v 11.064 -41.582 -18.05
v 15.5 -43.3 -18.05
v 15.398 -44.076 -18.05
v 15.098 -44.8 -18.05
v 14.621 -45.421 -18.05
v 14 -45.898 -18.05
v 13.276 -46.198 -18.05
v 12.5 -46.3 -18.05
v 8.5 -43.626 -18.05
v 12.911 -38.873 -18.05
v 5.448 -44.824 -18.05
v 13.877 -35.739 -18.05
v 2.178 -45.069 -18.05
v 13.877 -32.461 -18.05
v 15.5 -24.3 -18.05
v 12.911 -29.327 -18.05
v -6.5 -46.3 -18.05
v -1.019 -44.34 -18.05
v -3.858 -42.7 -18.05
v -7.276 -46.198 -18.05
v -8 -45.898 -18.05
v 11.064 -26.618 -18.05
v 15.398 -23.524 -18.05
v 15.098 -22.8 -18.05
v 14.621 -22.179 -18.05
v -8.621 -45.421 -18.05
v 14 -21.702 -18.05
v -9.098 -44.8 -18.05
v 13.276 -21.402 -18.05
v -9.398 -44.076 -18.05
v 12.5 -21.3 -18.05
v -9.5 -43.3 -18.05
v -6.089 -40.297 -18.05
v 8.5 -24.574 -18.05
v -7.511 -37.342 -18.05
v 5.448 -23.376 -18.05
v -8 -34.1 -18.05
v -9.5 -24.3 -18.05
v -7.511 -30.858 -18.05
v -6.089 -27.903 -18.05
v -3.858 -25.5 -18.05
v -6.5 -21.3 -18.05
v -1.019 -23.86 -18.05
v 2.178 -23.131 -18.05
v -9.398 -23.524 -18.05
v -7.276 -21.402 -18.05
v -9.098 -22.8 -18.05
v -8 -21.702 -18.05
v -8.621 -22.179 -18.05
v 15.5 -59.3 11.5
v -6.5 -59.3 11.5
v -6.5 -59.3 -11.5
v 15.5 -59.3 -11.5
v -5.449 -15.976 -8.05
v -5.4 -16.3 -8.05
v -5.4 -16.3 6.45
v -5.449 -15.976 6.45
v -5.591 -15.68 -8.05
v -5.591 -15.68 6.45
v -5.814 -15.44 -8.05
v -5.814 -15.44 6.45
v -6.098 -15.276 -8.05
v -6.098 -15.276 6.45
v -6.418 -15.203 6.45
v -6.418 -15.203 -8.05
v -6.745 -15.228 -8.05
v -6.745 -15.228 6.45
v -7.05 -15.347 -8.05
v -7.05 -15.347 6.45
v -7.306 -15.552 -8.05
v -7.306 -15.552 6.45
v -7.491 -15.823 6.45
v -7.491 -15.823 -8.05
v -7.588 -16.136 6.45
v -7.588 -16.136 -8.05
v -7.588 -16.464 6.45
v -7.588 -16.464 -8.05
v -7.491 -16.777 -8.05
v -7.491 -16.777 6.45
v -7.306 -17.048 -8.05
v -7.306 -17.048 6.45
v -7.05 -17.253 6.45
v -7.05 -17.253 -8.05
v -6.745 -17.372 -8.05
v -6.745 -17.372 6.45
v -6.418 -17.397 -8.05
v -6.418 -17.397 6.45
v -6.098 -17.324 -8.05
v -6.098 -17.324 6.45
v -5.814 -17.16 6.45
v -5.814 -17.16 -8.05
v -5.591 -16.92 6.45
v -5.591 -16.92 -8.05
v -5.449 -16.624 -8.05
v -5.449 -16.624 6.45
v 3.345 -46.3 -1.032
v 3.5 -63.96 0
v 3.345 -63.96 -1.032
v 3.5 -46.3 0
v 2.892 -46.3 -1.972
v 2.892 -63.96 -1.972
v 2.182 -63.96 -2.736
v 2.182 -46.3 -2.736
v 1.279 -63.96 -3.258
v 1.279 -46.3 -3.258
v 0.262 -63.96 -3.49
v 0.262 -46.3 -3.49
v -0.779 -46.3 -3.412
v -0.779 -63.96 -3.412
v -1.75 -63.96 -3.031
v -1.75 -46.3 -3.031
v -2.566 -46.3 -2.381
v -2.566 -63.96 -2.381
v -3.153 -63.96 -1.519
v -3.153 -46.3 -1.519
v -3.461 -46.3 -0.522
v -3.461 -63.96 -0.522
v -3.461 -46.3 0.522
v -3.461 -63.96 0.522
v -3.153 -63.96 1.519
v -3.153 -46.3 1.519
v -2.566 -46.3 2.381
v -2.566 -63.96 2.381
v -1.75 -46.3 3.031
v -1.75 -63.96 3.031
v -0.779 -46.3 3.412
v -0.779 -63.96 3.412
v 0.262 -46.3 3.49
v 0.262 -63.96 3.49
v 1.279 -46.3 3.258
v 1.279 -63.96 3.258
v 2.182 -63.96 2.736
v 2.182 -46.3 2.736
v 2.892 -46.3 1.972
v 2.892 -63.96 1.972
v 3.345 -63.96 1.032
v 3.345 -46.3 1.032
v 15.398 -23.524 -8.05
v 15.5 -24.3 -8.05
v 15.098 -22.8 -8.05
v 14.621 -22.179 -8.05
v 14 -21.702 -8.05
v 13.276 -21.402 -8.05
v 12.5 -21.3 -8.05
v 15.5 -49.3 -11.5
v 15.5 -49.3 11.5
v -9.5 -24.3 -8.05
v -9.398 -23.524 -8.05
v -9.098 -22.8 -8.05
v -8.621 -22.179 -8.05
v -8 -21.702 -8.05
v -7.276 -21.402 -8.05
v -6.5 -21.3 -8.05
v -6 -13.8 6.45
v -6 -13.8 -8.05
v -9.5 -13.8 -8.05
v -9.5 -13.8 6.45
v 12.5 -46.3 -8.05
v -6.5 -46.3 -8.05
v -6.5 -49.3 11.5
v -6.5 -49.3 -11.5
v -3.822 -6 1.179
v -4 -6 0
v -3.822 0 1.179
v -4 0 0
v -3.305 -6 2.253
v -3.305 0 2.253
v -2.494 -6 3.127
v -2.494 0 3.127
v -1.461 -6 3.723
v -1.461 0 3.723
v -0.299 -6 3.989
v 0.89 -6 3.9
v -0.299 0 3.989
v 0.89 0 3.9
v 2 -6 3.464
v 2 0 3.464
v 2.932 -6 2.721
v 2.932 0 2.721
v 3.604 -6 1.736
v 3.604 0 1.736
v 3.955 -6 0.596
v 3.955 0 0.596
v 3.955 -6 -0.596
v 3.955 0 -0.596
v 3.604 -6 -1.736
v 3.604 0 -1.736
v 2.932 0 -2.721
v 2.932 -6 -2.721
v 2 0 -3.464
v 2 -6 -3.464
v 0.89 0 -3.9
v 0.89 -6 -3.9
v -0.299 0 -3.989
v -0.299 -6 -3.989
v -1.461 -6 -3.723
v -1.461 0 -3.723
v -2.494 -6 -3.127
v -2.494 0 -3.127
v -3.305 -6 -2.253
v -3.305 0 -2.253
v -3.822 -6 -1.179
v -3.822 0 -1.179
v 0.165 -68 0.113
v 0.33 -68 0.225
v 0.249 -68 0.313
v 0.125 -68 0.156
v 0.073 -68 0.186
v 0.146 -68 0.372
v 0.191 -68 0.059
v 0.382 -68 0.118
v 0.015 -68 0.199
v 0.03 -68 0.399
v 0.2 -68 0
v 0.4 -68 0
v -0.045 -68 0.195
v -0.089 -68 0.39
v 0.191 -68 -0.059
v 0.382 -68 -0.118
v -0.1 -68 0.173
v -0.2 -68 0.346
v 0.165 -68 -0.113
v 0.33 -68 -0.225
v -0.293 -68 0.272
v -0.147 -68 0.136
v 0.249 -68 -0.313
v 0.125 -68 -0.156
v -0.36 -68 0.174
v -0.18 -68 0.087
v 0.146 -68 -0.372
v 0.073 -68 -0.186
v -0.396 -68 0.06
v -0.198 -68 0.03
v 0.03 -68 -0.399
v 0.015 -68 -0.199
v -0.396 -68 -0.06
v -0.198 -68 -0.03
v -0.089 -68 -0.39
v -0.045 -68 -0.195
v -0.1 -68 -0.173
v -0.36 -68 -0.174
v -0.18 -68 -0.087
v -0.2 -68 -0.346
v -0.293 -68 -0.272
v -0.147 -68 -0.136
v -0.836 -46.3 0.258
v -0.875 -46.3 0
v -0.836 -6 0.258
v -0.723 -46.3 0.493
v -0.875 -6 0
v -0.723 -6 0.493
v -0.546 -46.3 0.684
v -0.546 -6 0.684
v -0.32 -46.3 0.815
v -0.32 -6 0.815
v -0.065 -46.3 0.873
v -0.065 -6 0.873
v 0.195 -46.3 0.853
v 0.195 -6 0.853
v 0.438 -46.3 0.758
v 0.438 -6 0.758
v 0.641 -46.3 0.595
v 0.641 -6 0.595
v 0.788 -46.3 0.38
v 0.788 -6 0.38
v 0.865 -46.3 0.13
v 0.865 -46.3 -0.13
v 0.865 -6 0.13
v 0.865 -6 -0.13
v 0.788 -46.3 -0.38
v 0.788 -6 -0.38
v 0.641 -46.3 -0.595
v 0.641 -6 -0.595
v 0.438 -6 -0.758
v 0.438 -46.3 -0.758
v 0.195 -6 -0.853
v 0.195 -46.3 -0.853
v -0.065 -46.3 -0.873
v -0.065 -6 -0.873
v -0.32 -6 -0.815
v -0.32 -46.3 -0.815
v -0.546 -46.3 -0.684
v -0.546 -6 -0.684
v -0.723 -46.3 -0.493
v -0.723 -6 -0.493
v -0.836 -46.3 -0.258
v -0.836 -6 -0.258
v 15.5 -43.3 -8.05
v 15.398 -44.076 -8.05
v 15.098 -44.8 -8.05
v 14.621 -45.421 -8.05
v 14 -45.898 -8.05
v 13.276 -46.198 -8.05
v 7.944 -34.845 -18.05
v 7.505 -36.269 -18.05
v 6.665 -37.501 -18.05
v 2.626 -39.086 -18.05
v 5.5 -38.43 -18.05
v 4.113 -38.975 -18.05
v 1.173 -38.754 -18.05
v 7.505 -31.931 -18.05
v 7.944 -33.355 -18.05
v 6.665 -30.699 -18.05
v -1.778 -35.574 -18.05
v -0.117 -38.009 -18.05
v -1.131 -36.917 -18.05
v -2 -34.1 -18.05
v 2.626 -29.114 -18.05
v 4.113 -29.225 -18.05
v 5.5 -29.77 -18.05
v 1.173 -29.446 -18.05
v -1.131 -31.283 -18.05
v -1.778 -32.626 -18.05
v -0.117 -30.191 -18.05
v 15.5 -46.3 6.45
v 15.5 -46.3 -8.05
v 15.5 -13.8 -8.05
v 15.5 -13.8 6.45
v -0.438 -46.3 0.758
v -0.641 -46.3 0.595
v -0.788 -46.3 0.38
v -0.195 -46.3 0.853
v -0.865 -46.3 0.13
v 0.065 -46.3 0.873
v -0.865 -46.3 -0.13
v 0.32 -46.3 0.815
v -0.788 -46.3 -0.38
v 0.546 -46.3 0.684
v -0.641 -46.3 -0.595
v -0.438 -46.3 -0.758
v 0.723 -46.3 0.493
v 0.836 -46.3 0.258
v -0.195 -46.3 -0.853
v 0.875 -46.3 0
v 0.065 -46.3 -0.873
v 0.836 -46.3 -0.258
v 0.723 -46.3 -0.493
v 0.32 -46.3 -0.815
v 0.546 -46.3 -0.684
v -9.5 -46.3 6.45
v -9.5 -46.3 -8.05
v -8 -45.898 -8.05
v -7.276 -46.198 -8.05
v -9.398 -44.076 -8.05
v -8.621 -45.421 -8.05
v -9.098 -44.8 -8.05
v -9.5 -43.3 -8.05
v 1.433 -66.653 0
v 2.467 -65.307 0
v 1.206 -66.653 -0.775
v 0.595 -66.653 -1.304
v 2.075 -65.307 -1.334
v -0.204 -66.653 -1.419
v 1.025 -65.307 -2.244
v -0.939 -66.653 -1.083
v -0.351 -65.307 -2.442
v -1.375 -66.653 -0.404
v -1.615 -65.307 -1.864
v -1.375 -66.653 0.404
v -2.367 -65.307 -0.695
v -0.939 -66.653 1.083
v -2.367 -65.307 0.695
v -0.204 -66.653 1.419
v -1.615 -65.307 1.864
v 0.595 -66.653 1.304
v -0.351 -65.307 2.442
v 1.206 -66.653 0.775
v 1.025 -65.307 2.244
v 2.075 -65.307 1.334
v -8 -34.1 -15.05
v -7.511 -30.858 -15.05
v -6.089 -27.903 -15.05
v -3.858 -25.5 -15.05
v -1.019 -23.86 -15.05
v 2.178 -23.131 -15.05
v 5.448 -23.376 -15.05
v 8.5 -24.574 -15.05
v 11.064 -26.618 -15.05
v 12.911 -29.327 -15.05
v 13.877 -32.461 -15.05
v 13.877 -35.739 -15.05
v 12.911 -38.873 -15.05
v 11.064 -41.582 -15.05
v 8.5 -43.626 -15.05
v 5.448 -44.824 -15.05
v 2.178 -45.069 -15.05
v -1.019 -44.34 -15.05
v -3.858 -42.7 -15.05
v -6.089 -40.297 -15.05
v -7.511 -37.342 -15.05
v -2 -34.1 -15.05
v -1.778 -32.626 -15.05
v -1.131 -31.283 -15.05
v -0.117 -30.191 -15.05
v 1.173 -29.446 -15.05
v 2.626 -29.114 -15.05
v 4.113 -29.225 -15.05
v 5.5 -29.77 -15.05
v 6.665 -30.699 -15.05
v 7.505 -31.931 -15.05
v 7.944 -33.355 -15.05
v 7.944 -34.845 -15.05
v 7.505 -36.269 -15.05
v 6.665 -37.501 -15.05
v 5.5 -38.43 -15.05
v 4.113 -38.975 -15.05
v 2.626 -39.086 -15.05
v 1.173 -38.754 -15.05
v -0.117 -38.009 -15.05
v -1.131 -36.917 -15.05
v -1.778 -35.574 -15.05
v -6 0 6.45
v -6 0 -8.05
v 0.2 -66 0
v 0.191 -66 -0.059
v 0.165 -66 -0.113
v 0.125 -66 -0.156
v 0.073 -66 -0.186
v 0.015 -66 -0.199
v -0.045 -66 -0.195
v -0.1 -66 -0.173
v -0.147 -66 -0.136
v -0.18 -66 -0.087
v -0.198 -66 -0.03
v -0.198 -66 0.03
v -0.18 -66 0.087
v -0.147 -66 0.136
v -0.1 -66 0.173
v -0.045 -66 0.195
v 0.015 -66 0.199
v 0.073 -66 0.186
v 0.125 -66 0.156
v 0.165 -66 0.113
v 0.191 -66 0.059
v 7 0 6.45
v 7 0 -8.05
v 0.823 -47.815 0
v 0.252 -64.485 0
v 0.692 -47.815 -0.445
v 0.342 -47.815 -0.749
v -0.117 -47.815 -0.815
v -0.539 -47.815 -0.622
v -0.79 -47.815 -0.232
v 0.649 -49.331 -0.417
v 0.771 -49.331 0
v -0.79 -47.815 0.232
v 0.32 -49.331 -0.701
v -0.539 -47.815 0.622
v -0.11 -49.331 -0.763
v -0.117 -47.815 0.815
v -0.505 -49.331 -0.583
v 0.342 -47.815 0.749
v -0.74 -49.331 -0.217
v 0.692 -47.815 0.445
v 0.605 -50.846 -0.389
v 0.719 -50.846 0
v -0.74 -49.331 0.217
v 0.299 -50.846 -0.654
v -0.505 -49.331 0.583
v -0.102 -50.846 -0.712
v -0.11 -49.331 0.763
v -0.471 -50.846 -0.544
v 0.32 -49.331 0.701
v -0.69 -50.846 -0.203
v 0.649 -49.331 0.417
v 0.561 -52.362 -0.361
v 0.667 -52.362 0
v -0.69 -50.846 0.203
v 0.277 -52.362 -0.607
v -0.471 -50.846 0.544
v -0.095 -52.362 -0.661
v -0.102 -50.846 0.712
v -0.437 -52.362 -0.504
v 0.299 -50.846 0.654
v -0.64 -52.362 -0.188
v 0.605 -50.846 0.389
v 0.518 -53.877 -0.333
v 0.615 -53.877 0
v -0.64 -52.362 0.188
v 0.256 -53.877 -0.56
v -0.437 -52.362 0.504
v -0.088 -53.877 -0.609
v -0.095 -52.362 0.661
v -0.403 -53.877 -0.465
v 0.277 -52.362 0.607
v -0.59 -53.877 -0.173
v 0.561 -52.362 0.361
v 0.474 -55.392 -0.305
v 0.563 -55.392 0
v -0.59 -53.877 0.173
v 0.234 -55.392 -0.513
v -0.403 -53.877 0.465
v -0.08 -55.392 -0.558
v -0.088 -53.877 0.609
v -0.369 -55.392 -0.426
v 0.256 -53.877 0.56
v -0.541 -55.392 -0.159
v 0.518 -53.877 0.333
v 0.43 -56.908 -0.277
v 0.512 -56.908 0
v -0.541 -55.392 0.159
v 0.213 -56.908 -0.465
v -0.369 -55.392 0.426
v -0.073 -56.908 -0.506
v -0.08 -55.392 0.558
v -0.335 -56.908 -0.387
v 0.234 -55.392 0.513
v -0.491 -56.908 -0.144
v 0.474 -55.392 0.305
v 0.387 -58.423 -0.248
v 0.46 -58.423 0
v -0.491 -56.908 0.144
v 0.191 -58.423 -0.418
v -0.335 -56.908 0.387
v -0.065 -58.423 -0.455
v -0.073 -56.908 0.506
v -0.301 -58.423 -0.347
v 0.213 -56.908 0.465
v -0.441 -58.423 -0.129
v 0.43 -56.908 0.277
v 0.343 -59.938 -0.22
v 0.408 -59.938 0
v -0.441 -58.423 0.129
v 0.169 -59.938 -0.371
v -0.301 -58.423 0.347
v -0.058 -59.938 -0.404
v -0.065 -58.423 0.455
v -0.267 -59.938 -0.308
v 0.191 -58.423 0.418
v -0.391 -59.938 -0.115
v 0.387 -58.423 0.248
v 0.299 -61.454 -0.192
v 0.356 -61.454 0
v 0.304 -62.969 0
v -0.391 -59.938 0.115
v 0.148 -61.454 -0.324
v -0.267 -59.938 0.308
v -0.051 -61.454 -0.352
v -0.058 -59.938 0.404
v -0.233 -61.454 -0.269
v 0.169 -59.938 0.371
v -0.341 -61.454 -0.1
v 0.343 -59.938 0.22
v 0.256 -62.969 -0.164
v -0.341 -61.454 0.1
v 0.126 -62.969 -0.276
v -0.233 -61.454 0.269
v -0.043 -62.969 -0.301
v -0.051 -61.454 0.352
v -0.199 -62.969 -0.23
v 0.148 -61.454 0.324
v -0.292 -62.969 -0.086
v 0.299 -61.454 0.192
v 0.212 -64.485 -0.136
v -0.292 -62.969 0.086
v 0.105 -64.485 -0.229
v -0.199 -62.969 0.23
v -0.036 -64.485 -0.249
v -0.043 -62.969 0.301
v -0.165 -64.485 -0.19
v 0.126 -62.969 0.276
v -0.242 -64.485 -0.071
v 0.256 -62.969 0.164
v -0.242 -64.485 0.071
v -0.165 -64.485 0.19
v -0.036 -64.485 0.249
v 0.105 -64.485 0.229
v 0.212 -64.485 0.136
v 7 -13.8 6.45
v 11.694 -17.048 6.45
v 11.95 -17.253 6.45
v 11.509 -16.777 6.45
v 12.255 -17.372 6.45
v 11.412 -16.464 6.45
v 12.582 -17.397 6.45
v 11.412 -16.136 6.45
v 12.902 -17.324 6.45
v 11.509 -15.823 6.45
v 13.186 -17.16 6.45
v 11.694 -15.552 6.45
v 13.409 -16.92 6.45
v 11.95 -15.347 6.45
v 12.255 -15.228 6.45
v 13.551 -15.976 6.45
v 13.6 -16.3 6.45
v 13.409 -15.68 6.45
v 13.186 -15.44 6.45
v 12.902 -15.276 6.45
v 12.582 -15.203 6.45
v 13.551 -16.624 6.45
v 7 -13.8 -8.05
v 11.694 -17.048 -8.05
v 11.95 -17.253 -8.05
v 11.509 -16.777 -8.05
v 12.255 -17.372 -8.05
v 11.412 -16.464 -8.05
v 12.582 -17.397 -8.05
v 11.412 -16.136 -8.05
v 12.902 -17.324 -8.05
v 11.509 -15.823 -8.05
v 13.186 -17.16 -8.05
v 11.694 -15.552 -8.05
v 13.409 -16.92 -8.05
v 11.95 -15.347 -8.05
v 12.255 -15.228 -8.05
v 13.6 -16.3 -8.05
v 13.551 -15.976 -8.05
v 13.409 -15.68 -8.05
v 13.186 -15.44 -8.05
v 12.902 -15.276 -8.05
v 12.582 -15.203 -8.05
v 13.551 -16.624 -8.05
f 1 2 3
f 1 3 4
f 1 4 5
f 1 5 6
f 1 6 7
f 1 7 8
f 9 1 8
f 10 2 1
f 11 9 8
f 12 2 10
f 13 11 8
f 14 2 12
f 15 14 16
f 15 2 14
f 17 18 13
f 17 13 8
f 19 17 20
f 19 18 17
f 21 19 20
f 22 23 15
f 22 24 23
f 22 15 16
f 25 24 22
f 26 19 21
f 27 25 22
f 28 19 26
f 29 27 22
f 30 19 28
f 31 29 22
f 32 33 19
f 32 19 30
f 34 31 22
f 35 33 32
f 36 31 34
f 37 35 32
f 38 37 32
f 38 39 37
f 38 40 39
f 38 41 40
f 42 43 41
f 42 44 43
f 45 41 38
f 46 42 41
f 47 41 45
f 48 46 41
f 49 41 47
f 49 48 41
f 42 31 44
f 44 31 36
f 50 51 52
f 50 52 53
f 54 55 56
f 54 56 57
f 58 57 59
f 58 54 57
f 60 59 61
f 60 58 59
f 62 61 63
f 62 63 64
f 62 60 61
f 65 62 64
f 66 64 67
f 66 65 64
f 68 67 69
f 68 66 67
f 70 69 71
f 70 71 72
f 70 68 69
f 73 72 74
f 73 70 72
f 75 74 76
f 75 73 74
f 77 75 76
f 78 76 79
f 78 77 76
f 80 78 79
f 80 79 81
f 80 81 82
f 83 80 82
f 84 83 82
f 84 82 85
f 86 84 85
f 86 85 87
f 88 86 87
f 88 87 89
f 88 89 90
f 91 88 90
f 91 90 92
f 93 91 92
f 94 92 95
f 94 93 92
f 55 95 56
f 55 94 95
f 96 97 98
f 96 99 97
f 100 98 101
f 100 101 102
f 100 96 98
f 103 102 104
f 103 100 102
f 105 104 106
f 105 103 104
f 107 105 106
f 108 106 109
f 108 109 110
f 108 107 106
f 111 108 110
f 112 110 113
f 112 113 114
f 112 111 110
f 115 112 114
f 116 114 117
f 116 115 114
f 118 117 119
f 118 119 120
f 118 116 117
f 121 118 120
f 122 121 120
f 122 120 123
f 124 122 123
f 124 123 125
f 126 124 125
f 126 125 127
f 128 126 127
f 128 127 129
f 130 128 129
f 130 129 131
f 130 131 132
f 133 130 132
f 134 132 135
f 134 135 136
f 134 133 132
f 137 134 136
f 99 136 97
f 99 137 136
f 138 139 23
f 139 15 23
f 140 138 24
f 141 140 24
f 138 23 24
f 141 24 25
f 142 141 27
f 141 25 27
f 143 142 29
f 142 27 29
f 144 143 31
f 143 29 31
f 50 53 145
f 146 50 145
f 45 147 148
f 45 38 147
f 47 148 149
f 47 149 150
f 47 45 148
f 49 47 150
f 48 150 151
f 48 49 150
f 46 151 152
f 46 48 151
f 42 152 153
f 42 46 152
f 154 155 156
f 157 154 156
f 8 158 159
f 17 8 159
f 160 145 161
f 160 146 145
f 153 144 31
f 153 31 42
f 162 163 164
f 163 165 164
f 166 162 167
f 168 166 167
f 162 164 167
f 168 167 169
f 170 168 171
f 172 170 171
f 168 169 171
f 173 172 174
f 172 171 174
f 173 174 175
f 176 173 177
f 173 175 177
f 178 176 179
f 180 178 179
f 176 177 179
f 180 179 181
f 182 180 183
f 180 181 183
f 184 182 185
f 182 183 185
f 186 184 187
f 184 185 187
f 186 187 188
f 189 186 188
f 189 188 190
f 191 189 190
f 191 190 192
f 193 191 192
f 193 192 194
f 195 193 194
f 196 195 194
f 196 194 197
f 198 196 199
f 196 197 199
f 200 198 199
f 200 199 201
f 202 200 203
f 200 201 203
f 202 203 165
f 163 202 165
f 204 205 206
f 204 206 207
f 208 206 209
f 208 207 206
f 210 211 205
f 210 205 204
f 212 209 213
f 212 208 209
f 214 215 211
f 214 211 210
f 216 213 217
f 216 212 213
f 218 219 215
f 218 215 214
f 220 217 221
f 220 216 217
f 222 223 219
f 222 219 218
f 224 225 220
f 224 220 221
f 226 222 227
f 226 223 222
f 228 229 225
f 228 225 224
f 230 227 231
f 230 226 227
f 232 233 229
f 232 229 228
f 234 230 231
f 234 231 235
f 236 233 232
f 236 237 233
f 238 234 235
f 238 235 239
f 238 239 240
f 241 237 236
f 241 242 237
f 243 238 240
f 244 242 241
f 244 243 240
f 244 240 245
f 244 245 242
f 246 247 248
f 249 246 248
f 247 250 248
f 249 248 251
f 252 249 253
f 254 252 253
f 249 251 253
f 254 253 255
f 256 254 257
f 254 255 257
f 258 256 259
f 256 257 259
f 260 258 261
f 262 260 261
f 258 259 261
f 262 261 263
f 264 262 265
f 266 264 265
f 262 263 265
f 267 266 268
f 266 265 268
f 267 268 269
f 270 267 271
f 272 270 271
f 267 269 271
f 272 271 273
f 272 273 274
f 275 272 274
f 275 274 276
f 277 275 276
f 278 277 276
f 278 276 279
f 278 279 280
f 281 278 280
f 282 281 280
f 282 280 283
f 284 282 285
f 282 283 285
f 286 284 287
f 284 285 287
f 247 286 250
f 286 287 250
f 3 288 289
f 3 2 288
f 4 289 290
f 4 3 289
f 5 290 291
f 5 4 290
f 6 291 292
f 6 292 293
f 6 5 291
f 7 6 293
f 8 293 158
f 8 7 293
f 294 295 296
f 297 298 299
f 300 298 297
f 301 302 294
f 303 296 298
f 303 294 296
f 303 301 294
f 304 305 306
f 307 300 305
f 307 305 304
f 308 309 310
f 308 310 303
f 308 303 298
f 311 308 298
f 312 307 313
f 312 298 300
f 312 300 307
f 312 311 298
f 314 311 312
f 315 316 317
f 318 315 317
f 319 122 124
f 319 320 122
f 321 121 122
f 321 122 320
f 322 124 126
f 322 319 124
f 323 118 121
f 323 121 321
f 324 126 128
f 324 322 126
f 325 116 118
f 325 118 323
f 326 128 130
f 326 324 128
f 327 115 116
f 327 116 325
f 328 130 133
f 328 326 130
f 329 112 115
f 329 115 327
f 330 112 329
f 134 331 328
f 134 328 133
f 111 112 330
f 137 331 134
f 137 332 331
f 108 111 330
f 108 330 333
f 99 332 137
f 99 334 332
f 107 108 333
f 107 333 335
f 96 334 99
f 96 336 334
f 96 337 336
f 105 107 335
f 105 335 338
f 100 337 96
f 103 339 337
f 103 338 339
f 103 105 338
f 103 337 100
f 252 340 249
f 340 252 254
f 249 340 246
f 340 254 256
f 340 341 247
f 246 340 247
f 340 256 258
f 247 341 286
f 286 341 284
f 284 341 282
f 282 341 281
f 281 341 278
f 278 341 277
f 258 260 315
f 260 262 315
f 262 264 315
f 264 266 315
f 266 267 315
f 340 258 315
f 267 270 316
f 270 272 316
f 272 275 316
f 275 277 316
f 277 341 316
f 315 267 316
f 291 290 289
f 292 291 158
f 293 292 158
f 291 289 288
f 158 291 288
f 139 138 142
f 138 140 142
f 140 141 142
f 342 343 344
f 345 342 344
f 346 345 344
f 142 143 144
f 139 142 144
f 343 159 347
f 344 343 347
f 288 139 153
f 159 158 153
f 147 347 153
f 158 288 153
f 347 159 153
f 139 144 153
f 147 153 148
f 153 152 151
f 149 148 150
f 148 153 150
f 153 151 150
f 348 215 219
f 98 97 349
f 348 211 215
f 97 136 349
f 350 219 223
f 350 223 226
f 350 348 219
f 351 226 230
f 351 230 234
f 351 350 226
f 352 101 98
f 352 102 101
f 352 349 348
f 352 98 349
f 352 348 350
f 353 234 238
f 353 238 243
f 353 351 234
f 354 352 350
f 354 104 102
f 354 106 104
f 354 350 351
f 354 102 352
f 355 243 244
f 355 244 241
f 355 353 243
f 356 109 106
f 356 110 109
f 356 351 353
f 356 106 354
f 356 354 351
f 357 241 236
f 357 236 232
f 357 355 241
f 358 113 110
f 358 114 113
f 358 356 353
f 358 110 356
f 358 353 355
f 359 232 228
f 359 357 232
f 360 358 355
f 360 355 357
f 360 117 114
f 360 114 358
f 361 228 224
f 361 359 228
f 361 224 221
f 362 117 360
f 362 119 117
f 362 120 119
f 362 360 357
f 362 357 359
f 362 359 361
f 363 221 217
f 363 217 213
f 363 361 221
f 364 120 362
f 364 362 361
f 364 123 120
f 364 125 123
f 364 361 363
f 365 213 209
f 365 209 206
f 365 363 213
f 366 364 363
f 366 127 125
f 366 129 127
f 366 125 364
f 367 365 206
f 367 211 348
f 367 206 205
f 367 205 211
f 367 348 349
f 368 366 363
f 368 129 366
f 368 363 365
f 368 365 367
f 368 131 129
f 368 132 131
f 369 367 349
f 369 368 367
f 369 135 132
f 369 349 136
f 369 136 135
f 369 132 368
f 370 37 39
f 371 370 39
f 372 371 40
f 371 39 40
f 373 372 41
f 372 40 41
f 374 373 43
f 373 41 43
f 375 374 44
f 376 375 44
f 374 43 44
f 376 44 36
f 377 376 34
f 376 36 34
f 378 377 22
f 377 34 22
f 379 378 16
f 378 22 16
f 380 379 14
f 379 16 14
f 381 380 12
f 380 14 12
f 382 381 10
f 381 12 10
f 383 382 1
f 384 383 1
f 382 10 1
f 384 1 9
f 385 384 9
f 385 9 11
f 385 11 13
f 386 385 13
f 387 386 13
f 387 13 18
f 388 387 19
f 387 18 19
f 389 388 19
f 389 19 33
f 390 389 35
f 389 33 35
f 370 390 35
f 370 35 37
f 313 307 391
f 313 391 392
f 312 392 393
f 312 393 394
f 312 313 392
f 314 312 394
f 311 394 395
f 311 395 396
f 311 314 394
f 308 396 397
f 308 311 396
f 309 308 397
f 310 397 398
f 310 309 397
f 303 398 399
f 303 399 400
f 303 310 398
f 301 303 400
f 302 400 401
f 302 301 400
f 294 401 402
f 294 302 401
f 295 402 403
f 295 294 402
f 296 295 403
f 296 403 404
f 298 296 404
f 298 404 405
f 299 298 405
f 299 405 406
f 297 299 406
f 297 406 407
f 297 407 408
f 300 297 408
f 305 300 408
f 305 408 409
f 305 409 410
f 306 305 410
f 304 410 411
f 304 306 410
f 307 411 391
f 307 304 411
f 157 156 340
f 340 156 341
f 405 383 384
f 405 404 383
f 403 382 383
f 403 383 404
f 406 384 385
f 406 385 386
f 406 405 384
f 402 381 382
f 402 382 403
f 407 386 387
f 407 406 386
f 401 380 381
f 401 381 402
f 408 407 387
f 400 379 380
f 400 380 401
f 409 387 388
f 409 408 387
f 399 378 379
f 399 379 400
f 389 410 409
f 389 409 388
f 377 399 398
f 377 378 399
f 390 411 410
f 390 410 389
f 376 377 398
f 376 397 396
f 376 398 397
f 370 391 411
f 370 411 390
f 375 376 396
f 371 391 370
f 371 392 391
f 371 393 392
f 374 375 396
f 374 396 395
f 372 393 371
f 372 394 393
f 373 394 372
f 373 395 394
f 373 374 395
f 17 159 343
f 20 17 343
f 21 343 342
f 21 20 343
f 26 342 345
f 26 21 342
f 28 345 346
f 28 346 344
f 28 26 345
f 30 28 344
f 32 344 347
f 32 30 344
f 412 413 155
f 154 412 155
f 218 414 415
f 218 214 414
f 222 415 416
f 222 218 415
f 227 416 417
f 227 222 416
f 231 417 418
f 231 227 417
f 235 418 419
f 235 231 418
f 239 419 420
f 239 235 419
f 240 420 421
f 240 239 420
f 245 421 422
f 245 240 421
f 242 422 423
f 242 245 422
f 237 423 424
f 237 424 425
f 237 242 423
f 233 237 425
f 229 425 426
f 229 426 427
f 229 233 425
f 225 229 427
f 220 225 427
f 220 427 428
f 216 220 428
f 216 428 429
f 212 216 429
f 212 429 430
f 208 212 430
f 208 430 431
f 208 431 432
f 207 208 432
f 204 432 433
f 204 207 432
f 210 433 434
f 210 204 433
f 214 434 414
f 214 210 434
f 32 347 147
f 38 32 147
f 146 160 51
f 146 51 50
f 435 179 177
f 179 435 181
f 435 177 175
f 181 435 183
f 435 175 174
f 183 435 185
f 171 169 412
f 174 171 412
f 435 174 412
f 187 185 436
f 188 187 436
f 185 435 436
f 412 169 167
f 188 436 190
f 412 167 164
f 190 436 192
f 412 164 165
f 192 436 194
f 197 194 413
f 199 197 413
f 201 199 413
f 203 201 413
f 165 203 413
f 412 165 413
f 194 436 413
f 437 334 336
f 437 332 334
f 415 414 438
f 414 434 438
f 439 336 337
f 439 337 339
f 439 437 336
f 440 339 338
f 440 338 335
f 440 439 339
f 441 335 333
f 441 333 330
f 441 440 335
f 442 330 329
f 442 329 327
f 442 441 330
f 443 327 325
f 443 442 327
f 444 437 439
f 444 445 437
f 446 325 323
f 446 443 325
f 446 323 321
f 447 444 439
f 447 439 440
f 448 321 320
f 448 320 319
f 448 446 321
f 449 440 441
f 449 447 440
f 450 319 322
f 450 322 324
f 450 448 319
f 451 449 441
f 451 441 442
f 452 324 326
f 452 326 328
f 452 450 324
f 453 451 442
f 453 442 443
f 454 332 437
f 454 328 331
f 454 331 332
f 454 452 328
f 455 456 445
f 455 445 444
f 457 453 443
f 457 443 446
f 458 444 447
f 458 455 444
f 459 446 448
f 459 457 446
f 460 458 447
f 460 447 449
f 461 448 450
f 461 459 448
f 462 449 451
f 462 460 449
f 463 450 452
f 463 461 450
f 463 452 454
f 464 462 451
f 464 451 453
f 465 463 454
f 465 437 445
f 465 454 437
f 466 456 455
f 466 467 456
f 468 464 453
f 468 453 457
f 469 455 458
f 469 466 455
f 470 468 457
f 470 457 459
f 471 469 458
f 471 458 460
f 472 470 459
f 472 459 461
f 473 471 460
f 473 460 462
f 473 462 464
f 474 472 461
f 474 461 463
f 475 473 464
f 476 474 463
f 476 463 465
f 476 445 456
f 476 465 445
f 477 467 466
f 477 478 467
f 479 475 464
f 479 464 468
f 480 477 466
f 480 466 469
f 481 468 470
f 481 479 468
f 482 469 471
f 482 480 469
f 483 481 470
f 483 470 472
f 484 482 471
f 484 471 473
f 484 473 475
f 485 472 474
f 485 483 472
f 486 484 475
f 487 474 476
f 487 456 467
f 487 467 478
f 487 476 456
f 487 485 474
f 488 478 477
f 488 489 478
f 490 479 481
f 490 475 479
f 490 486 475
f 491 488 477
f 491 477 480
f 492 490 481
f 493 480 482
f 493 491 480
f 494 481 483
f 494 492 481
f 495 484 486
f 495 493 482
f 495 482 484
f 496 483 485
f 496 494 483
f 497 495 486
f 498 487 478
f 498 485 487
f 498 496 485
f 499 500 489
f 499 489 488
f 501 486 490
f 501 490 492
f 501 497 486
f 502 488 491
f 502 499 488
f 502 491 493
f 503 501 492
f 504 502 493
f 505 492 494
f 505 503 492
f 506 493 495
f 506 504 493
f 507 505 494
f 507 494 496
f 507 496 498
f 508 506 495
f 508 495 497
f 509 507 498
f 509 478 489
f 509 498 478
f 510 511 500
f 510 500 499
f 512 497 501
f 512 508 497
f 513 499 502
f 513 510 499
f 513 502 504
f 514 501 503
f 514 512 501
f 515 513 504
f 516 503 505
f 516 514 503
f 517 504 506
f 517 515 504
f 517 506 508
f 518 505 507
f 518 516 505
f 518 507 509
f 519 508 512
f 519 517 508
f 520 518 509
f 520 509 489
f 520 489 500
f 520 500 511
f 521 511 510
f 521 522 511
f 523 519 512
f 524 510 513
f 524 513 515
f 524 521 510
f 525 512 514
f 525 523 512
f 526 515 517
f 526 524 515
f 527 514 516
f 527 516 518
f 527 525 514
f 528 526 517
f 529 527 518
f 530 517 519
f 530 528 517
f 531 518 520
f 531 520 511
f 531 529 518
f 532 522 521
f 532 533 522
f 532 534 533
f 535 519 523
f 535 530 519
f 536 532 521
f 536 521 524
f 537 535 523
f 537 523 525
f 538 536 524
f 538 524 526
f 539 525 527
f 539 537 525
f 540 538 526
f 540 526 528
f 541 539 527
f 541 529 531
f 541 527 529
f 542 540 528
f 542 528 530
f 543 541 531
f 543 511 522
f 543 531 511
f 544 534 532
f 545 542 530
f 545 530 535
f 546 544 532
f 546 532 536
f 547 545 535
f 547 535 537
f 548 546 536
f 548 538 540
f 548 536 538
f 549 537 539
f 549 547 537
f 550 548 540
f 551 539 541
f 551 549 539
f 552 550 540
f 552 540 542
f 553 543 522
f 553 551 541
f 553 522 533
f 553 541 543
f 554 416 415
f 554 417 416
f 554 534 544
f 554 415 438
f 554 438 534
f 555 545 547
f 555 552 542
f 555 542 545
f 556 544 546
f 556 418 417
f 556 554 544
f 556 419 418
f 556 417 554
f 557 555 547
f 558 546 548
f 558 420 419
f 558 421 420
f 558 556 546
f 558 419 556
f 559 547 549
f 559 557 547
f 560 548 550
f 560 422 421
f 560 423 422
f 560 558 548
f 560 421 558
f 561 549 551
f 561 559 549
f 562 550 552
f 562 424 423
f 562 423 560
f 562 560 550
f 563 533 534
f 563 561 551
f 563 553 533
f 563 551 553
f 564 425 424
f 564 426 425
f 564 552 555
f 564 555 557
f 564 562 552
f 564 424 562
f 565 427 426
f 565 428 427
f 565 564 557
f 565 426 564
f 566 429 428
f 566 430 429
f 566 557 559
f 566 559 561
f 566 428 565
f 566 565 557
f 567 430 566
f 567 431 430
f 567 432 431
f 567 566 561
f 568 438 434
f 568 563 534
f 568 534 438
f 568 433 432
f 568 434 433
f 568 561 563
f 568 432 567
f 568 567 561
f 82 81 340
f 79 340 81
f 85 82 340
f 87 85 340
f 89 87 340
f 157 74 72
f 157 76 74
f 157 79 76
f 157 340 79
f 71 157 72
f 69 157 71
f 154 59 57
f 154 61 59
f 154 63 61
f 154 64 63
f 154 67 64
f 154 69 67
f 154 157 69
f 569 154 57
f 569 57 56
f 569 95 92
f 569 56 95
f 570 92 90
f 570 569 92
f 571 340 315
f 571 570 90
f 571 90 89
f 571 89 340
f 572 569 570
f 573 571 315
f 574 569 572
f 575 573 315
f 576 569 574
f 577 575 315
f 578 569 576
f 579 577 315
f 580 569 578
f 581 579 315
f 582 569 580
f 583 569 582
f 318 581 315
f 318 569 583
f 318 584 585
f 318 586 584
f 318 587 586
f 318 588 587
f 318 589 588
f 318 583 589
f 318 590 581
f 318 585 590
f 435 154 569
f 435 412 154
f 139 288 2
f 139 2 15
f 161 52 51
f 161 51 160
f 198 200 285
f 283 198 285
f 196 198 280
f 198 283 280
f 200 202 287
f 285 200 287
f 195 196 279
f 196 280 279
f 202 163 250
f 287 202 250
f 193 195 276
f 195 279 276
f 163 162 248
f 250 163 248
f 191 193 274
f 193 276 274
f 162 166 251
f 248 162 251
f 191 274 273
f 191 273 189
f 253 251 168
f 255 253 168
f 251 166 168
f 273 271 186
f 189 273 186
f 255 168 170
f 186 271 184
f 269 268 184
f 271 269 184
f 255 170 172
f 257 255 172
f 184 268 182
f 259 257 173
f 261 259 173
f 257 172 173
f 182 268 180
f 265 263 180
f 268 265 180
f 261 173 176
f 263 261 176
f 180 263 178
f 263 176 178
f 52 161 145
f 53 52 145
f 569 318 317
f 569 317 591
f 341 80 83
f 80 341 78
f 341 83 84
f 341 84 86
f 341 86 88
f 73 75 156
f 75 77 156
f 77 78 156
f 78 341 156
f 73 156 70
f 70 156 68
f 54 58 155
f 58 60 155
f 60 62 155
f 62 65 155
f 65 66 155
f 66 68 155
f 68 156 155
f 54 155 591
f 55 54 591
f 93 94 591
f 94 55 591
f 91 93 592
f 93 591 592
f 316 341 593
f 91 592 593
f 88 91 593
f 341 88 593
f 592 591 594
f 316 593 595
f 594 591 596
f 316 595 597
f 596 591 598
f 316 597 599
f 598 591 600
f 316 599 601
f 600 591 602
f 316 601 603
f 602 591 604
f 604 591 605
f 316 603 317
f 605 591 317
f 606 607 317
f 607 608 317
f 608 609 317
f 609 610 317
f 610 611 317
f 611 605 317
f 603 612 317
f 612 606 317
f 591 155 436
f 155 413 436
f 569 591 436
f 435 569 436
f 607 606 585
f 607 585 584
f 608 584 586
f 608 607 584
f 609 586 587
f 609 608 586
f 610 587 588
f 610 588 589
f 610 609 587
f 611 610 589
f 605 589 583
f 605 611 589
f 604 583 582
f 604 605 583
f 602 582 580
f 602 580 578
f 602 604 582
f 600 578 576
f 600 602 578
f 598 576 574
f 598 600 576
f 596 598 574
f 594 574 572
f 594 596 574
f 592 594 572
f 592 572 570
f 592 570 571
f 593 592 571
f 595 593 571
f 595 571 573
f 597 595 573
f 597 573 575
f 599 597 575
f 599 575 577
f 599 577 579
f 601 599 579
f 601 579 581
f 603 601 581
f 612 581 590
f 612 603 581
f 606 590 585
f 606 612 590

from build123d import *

# Parameters (mm, degrees)
BOSS_EXTRUDE1_DEPTH        = 6.45
BOSS_EXTRUDE1_DEPTH_BACK   = 8.05
SKETCH1_R                  = 1.1
BOSS_EXTRUDE1_2_DEPTH      = 6.45
BOSS_EXTRUDE1_2_DEPTH_BACK = 8.05
SKETCH1_W                  = 22
SKETCH1_H                  = 10
SKETCH1_7_W                = 6.5
SKETCH1_7_H                = 10
SKETCH1_7_W_2              = 12
BOSS_EXTRUDE2_DEPTH        = 11.5
SKETCH2_W                  = 25
SKETCH2_H                  = 25
SKETCH2_R                  = 11
SKETCH2_R_2                = 5
BOSS_EXTRUDE3_DEPTH        = 10
CUT_EXTRUDE1_START         = 10
SKETCH2_3_R                = 11
SKETCH2_3_R_2              = 5
CUT_EXTRUDE1_DEPTH         = 3
FILLET1_R                  = 3


# Read off the part's stored shape, not the designer's step: Revolve1
with BuildPart() as part:
    # Sketch1 → Boss-Extrude1 (new, two sides: drawn at the far end of the back side and taken through both)
    with BuildSketch(Plane.XY.offset(-BOSS_EXTRUDE1_DEPTH_BACK)):
        Polygon((7, 0), (-6, 0), (-6, -13.8), (-9.5, -13.8), (-9.5, -46.3), (15.5, -46.3), (15.5, -13.8), (7, -13.8), align=None)
        with Locations((-6.5, -16.3)):
            Circle(SKETCH1_R, mode=Mode.SUBTRACT)
        with Locations((12.5, -16.3)):
            Circle(SKETCH1_R, mode=Mode.SUBTRACT)
    extrude(amount=BOSS_EXTRUDE1_DEPTH + BOSS_EXTRUDE1_DEPTH_BACK)

    # Sketch1<6> → Cut-Revolve1 (revolve, cut)
    with BuildSketch(Plane.XY, mode=Mode.PRIVATE) as cut_revolve1_sk:
        Polygon((4, -6), (4, 0), (0, 0), (0, -46.3), (0.875, -46.3), (0.875, -6), align=None)
    revolve(cut_revolve1_sk.sketch.rotate(Axis((0, -281.964182831, 0), (0, 1, 0)), 180), axis=Axis((0, -281.964182831, 0), (0, 1, 0)), mode=Mode.SUBTRACT)


with BuildPart() as body_2:
    # Sketch1 → Boss-Extrude1 2 (new, two sides: drawn at the far end of the back side and taken through both)
    with BuildSketch(Plane.XY.offset(-BOSS_EXTRUDE1_2_DEPTH_BACK)):
        with Locations((4.5, -54.3)):
            Rectangle(SKETCH1_W, SKETCH1_H)
    extrude(amount=BOSS_EXTRUDE1_2_DEPTH + BOSS_EXTRUDE1_2_DEPTH_BACK)

    # Sketch1<7> → Boss-Extrude2 (add, symmetric)
    with BuildSketch(Plane.XY):
        with Locations((-3.25, -54.3)):
            Rectangle(SKETCH1_7_W, SKETCH1_7_H)
        Polygon((0.772208122, -49.3), (0, -49.3), (0, -59.3), (0.429568528, -59.3), align=None)
        Polygon((3.5, -49.3), (0.772208122, -49.3), (0.429568528, -59.3), (3.5, -59.3), align=None)
        with Locations((9.5, -54.3)):
            Rectangle(SKETCH1_7_W_2, SKETCH1_7_H)
    extrude(amount=BOSS_EXTRUDE2_DEPTH, both=True)


with BuildPart() as body_3:
    # Revolve1 outline → Revolve1 (revolve)
    with BuildSketch(Plane.XY):
        Polygon((0.875, -46.3), (0.2, -66), (0.2, -68), (0.4, -68), (3.5, -63.960001344), (3.5, -46.3), align=None)
    revolve(axis=Axis((0, 0, 0), (0, 1, 0)))


with BuildPart() as body_4:
    # Sketch2 → Boss-Extrude3 (new body)
    # profile 1 of 3: a face of its own
    with BuildSketch(Plane(origin=(0, 0, -8.05), x_dir=(-1, 0, 0), z_dir=(0, 0, -1))):
        with Locations((-3, -33.8)):
            Rectangle(SKETCH2_W, SKETCH2_H)
        with Locations((-3, -34.1)):
            Circle(SKETCH2_R, mode=Mode.SUBTRACT)
    # profile 2 of 3: a face of its own
    with BuildSketch(Plane(origin=(0, 0, -8.05), x_dir=(-1, 0, 0), z_dir=(0, 0, -1))):
        with Locations((-3, -34.1)):
            Circle(SKETCH2_R)
        with Locations((-3, -34.1)):
            Circle(SKETCH2_R_2, mode=Mode.SUBTRACT)
    # profile 3 of 3: a face of its own
    with BuildSketch(Plane(origin=(0, 0, -8.05), x_dir=(-1, 0, 0), z_dir=(0, 0, -1))):
        with Locations((-3, -34.1)):
            Circle(SKETCH2_R_2)
    extrude(amount=BOSS_EXTRUDE3_DEPTH)

    # Sketch2<3> → Cut-Extrude1 (cut)
    with BuildSketch(Plane(origin=(0, 0, -8.05), x_dir=(-1, 0, 0), z_dir=(0, 0, -1)).offset(CUT_EXTRUDE1_START)):
        with Locations((-3, -34.1)):
            Circle(SKETCH2_3_R)
        with Locations((-3, -34.1)):
            Circle(SKETCH2_3_R_2, mode=Mode.SUBTRACT)
    extrude(amount=-CUT_EXTRUDE1_DEPTH, mode=Mode.SUBTRACT)

    # Fillet1
    fillet1_edges = [body_4.edges().sort_by_distance(p)[0] for p in [
        (-9.5, -21.3, -13.05),
        (-9.5, -46.3, -13.05),
        (15.5, -46.3, -13.05),
        (15.5, -21.3, -13.05),
    ]]
    fillet(fillet1_edges, radius=FILLET1_R)


solid = Compound([part.part, body_2.part, body_3.part, body_4.part])
